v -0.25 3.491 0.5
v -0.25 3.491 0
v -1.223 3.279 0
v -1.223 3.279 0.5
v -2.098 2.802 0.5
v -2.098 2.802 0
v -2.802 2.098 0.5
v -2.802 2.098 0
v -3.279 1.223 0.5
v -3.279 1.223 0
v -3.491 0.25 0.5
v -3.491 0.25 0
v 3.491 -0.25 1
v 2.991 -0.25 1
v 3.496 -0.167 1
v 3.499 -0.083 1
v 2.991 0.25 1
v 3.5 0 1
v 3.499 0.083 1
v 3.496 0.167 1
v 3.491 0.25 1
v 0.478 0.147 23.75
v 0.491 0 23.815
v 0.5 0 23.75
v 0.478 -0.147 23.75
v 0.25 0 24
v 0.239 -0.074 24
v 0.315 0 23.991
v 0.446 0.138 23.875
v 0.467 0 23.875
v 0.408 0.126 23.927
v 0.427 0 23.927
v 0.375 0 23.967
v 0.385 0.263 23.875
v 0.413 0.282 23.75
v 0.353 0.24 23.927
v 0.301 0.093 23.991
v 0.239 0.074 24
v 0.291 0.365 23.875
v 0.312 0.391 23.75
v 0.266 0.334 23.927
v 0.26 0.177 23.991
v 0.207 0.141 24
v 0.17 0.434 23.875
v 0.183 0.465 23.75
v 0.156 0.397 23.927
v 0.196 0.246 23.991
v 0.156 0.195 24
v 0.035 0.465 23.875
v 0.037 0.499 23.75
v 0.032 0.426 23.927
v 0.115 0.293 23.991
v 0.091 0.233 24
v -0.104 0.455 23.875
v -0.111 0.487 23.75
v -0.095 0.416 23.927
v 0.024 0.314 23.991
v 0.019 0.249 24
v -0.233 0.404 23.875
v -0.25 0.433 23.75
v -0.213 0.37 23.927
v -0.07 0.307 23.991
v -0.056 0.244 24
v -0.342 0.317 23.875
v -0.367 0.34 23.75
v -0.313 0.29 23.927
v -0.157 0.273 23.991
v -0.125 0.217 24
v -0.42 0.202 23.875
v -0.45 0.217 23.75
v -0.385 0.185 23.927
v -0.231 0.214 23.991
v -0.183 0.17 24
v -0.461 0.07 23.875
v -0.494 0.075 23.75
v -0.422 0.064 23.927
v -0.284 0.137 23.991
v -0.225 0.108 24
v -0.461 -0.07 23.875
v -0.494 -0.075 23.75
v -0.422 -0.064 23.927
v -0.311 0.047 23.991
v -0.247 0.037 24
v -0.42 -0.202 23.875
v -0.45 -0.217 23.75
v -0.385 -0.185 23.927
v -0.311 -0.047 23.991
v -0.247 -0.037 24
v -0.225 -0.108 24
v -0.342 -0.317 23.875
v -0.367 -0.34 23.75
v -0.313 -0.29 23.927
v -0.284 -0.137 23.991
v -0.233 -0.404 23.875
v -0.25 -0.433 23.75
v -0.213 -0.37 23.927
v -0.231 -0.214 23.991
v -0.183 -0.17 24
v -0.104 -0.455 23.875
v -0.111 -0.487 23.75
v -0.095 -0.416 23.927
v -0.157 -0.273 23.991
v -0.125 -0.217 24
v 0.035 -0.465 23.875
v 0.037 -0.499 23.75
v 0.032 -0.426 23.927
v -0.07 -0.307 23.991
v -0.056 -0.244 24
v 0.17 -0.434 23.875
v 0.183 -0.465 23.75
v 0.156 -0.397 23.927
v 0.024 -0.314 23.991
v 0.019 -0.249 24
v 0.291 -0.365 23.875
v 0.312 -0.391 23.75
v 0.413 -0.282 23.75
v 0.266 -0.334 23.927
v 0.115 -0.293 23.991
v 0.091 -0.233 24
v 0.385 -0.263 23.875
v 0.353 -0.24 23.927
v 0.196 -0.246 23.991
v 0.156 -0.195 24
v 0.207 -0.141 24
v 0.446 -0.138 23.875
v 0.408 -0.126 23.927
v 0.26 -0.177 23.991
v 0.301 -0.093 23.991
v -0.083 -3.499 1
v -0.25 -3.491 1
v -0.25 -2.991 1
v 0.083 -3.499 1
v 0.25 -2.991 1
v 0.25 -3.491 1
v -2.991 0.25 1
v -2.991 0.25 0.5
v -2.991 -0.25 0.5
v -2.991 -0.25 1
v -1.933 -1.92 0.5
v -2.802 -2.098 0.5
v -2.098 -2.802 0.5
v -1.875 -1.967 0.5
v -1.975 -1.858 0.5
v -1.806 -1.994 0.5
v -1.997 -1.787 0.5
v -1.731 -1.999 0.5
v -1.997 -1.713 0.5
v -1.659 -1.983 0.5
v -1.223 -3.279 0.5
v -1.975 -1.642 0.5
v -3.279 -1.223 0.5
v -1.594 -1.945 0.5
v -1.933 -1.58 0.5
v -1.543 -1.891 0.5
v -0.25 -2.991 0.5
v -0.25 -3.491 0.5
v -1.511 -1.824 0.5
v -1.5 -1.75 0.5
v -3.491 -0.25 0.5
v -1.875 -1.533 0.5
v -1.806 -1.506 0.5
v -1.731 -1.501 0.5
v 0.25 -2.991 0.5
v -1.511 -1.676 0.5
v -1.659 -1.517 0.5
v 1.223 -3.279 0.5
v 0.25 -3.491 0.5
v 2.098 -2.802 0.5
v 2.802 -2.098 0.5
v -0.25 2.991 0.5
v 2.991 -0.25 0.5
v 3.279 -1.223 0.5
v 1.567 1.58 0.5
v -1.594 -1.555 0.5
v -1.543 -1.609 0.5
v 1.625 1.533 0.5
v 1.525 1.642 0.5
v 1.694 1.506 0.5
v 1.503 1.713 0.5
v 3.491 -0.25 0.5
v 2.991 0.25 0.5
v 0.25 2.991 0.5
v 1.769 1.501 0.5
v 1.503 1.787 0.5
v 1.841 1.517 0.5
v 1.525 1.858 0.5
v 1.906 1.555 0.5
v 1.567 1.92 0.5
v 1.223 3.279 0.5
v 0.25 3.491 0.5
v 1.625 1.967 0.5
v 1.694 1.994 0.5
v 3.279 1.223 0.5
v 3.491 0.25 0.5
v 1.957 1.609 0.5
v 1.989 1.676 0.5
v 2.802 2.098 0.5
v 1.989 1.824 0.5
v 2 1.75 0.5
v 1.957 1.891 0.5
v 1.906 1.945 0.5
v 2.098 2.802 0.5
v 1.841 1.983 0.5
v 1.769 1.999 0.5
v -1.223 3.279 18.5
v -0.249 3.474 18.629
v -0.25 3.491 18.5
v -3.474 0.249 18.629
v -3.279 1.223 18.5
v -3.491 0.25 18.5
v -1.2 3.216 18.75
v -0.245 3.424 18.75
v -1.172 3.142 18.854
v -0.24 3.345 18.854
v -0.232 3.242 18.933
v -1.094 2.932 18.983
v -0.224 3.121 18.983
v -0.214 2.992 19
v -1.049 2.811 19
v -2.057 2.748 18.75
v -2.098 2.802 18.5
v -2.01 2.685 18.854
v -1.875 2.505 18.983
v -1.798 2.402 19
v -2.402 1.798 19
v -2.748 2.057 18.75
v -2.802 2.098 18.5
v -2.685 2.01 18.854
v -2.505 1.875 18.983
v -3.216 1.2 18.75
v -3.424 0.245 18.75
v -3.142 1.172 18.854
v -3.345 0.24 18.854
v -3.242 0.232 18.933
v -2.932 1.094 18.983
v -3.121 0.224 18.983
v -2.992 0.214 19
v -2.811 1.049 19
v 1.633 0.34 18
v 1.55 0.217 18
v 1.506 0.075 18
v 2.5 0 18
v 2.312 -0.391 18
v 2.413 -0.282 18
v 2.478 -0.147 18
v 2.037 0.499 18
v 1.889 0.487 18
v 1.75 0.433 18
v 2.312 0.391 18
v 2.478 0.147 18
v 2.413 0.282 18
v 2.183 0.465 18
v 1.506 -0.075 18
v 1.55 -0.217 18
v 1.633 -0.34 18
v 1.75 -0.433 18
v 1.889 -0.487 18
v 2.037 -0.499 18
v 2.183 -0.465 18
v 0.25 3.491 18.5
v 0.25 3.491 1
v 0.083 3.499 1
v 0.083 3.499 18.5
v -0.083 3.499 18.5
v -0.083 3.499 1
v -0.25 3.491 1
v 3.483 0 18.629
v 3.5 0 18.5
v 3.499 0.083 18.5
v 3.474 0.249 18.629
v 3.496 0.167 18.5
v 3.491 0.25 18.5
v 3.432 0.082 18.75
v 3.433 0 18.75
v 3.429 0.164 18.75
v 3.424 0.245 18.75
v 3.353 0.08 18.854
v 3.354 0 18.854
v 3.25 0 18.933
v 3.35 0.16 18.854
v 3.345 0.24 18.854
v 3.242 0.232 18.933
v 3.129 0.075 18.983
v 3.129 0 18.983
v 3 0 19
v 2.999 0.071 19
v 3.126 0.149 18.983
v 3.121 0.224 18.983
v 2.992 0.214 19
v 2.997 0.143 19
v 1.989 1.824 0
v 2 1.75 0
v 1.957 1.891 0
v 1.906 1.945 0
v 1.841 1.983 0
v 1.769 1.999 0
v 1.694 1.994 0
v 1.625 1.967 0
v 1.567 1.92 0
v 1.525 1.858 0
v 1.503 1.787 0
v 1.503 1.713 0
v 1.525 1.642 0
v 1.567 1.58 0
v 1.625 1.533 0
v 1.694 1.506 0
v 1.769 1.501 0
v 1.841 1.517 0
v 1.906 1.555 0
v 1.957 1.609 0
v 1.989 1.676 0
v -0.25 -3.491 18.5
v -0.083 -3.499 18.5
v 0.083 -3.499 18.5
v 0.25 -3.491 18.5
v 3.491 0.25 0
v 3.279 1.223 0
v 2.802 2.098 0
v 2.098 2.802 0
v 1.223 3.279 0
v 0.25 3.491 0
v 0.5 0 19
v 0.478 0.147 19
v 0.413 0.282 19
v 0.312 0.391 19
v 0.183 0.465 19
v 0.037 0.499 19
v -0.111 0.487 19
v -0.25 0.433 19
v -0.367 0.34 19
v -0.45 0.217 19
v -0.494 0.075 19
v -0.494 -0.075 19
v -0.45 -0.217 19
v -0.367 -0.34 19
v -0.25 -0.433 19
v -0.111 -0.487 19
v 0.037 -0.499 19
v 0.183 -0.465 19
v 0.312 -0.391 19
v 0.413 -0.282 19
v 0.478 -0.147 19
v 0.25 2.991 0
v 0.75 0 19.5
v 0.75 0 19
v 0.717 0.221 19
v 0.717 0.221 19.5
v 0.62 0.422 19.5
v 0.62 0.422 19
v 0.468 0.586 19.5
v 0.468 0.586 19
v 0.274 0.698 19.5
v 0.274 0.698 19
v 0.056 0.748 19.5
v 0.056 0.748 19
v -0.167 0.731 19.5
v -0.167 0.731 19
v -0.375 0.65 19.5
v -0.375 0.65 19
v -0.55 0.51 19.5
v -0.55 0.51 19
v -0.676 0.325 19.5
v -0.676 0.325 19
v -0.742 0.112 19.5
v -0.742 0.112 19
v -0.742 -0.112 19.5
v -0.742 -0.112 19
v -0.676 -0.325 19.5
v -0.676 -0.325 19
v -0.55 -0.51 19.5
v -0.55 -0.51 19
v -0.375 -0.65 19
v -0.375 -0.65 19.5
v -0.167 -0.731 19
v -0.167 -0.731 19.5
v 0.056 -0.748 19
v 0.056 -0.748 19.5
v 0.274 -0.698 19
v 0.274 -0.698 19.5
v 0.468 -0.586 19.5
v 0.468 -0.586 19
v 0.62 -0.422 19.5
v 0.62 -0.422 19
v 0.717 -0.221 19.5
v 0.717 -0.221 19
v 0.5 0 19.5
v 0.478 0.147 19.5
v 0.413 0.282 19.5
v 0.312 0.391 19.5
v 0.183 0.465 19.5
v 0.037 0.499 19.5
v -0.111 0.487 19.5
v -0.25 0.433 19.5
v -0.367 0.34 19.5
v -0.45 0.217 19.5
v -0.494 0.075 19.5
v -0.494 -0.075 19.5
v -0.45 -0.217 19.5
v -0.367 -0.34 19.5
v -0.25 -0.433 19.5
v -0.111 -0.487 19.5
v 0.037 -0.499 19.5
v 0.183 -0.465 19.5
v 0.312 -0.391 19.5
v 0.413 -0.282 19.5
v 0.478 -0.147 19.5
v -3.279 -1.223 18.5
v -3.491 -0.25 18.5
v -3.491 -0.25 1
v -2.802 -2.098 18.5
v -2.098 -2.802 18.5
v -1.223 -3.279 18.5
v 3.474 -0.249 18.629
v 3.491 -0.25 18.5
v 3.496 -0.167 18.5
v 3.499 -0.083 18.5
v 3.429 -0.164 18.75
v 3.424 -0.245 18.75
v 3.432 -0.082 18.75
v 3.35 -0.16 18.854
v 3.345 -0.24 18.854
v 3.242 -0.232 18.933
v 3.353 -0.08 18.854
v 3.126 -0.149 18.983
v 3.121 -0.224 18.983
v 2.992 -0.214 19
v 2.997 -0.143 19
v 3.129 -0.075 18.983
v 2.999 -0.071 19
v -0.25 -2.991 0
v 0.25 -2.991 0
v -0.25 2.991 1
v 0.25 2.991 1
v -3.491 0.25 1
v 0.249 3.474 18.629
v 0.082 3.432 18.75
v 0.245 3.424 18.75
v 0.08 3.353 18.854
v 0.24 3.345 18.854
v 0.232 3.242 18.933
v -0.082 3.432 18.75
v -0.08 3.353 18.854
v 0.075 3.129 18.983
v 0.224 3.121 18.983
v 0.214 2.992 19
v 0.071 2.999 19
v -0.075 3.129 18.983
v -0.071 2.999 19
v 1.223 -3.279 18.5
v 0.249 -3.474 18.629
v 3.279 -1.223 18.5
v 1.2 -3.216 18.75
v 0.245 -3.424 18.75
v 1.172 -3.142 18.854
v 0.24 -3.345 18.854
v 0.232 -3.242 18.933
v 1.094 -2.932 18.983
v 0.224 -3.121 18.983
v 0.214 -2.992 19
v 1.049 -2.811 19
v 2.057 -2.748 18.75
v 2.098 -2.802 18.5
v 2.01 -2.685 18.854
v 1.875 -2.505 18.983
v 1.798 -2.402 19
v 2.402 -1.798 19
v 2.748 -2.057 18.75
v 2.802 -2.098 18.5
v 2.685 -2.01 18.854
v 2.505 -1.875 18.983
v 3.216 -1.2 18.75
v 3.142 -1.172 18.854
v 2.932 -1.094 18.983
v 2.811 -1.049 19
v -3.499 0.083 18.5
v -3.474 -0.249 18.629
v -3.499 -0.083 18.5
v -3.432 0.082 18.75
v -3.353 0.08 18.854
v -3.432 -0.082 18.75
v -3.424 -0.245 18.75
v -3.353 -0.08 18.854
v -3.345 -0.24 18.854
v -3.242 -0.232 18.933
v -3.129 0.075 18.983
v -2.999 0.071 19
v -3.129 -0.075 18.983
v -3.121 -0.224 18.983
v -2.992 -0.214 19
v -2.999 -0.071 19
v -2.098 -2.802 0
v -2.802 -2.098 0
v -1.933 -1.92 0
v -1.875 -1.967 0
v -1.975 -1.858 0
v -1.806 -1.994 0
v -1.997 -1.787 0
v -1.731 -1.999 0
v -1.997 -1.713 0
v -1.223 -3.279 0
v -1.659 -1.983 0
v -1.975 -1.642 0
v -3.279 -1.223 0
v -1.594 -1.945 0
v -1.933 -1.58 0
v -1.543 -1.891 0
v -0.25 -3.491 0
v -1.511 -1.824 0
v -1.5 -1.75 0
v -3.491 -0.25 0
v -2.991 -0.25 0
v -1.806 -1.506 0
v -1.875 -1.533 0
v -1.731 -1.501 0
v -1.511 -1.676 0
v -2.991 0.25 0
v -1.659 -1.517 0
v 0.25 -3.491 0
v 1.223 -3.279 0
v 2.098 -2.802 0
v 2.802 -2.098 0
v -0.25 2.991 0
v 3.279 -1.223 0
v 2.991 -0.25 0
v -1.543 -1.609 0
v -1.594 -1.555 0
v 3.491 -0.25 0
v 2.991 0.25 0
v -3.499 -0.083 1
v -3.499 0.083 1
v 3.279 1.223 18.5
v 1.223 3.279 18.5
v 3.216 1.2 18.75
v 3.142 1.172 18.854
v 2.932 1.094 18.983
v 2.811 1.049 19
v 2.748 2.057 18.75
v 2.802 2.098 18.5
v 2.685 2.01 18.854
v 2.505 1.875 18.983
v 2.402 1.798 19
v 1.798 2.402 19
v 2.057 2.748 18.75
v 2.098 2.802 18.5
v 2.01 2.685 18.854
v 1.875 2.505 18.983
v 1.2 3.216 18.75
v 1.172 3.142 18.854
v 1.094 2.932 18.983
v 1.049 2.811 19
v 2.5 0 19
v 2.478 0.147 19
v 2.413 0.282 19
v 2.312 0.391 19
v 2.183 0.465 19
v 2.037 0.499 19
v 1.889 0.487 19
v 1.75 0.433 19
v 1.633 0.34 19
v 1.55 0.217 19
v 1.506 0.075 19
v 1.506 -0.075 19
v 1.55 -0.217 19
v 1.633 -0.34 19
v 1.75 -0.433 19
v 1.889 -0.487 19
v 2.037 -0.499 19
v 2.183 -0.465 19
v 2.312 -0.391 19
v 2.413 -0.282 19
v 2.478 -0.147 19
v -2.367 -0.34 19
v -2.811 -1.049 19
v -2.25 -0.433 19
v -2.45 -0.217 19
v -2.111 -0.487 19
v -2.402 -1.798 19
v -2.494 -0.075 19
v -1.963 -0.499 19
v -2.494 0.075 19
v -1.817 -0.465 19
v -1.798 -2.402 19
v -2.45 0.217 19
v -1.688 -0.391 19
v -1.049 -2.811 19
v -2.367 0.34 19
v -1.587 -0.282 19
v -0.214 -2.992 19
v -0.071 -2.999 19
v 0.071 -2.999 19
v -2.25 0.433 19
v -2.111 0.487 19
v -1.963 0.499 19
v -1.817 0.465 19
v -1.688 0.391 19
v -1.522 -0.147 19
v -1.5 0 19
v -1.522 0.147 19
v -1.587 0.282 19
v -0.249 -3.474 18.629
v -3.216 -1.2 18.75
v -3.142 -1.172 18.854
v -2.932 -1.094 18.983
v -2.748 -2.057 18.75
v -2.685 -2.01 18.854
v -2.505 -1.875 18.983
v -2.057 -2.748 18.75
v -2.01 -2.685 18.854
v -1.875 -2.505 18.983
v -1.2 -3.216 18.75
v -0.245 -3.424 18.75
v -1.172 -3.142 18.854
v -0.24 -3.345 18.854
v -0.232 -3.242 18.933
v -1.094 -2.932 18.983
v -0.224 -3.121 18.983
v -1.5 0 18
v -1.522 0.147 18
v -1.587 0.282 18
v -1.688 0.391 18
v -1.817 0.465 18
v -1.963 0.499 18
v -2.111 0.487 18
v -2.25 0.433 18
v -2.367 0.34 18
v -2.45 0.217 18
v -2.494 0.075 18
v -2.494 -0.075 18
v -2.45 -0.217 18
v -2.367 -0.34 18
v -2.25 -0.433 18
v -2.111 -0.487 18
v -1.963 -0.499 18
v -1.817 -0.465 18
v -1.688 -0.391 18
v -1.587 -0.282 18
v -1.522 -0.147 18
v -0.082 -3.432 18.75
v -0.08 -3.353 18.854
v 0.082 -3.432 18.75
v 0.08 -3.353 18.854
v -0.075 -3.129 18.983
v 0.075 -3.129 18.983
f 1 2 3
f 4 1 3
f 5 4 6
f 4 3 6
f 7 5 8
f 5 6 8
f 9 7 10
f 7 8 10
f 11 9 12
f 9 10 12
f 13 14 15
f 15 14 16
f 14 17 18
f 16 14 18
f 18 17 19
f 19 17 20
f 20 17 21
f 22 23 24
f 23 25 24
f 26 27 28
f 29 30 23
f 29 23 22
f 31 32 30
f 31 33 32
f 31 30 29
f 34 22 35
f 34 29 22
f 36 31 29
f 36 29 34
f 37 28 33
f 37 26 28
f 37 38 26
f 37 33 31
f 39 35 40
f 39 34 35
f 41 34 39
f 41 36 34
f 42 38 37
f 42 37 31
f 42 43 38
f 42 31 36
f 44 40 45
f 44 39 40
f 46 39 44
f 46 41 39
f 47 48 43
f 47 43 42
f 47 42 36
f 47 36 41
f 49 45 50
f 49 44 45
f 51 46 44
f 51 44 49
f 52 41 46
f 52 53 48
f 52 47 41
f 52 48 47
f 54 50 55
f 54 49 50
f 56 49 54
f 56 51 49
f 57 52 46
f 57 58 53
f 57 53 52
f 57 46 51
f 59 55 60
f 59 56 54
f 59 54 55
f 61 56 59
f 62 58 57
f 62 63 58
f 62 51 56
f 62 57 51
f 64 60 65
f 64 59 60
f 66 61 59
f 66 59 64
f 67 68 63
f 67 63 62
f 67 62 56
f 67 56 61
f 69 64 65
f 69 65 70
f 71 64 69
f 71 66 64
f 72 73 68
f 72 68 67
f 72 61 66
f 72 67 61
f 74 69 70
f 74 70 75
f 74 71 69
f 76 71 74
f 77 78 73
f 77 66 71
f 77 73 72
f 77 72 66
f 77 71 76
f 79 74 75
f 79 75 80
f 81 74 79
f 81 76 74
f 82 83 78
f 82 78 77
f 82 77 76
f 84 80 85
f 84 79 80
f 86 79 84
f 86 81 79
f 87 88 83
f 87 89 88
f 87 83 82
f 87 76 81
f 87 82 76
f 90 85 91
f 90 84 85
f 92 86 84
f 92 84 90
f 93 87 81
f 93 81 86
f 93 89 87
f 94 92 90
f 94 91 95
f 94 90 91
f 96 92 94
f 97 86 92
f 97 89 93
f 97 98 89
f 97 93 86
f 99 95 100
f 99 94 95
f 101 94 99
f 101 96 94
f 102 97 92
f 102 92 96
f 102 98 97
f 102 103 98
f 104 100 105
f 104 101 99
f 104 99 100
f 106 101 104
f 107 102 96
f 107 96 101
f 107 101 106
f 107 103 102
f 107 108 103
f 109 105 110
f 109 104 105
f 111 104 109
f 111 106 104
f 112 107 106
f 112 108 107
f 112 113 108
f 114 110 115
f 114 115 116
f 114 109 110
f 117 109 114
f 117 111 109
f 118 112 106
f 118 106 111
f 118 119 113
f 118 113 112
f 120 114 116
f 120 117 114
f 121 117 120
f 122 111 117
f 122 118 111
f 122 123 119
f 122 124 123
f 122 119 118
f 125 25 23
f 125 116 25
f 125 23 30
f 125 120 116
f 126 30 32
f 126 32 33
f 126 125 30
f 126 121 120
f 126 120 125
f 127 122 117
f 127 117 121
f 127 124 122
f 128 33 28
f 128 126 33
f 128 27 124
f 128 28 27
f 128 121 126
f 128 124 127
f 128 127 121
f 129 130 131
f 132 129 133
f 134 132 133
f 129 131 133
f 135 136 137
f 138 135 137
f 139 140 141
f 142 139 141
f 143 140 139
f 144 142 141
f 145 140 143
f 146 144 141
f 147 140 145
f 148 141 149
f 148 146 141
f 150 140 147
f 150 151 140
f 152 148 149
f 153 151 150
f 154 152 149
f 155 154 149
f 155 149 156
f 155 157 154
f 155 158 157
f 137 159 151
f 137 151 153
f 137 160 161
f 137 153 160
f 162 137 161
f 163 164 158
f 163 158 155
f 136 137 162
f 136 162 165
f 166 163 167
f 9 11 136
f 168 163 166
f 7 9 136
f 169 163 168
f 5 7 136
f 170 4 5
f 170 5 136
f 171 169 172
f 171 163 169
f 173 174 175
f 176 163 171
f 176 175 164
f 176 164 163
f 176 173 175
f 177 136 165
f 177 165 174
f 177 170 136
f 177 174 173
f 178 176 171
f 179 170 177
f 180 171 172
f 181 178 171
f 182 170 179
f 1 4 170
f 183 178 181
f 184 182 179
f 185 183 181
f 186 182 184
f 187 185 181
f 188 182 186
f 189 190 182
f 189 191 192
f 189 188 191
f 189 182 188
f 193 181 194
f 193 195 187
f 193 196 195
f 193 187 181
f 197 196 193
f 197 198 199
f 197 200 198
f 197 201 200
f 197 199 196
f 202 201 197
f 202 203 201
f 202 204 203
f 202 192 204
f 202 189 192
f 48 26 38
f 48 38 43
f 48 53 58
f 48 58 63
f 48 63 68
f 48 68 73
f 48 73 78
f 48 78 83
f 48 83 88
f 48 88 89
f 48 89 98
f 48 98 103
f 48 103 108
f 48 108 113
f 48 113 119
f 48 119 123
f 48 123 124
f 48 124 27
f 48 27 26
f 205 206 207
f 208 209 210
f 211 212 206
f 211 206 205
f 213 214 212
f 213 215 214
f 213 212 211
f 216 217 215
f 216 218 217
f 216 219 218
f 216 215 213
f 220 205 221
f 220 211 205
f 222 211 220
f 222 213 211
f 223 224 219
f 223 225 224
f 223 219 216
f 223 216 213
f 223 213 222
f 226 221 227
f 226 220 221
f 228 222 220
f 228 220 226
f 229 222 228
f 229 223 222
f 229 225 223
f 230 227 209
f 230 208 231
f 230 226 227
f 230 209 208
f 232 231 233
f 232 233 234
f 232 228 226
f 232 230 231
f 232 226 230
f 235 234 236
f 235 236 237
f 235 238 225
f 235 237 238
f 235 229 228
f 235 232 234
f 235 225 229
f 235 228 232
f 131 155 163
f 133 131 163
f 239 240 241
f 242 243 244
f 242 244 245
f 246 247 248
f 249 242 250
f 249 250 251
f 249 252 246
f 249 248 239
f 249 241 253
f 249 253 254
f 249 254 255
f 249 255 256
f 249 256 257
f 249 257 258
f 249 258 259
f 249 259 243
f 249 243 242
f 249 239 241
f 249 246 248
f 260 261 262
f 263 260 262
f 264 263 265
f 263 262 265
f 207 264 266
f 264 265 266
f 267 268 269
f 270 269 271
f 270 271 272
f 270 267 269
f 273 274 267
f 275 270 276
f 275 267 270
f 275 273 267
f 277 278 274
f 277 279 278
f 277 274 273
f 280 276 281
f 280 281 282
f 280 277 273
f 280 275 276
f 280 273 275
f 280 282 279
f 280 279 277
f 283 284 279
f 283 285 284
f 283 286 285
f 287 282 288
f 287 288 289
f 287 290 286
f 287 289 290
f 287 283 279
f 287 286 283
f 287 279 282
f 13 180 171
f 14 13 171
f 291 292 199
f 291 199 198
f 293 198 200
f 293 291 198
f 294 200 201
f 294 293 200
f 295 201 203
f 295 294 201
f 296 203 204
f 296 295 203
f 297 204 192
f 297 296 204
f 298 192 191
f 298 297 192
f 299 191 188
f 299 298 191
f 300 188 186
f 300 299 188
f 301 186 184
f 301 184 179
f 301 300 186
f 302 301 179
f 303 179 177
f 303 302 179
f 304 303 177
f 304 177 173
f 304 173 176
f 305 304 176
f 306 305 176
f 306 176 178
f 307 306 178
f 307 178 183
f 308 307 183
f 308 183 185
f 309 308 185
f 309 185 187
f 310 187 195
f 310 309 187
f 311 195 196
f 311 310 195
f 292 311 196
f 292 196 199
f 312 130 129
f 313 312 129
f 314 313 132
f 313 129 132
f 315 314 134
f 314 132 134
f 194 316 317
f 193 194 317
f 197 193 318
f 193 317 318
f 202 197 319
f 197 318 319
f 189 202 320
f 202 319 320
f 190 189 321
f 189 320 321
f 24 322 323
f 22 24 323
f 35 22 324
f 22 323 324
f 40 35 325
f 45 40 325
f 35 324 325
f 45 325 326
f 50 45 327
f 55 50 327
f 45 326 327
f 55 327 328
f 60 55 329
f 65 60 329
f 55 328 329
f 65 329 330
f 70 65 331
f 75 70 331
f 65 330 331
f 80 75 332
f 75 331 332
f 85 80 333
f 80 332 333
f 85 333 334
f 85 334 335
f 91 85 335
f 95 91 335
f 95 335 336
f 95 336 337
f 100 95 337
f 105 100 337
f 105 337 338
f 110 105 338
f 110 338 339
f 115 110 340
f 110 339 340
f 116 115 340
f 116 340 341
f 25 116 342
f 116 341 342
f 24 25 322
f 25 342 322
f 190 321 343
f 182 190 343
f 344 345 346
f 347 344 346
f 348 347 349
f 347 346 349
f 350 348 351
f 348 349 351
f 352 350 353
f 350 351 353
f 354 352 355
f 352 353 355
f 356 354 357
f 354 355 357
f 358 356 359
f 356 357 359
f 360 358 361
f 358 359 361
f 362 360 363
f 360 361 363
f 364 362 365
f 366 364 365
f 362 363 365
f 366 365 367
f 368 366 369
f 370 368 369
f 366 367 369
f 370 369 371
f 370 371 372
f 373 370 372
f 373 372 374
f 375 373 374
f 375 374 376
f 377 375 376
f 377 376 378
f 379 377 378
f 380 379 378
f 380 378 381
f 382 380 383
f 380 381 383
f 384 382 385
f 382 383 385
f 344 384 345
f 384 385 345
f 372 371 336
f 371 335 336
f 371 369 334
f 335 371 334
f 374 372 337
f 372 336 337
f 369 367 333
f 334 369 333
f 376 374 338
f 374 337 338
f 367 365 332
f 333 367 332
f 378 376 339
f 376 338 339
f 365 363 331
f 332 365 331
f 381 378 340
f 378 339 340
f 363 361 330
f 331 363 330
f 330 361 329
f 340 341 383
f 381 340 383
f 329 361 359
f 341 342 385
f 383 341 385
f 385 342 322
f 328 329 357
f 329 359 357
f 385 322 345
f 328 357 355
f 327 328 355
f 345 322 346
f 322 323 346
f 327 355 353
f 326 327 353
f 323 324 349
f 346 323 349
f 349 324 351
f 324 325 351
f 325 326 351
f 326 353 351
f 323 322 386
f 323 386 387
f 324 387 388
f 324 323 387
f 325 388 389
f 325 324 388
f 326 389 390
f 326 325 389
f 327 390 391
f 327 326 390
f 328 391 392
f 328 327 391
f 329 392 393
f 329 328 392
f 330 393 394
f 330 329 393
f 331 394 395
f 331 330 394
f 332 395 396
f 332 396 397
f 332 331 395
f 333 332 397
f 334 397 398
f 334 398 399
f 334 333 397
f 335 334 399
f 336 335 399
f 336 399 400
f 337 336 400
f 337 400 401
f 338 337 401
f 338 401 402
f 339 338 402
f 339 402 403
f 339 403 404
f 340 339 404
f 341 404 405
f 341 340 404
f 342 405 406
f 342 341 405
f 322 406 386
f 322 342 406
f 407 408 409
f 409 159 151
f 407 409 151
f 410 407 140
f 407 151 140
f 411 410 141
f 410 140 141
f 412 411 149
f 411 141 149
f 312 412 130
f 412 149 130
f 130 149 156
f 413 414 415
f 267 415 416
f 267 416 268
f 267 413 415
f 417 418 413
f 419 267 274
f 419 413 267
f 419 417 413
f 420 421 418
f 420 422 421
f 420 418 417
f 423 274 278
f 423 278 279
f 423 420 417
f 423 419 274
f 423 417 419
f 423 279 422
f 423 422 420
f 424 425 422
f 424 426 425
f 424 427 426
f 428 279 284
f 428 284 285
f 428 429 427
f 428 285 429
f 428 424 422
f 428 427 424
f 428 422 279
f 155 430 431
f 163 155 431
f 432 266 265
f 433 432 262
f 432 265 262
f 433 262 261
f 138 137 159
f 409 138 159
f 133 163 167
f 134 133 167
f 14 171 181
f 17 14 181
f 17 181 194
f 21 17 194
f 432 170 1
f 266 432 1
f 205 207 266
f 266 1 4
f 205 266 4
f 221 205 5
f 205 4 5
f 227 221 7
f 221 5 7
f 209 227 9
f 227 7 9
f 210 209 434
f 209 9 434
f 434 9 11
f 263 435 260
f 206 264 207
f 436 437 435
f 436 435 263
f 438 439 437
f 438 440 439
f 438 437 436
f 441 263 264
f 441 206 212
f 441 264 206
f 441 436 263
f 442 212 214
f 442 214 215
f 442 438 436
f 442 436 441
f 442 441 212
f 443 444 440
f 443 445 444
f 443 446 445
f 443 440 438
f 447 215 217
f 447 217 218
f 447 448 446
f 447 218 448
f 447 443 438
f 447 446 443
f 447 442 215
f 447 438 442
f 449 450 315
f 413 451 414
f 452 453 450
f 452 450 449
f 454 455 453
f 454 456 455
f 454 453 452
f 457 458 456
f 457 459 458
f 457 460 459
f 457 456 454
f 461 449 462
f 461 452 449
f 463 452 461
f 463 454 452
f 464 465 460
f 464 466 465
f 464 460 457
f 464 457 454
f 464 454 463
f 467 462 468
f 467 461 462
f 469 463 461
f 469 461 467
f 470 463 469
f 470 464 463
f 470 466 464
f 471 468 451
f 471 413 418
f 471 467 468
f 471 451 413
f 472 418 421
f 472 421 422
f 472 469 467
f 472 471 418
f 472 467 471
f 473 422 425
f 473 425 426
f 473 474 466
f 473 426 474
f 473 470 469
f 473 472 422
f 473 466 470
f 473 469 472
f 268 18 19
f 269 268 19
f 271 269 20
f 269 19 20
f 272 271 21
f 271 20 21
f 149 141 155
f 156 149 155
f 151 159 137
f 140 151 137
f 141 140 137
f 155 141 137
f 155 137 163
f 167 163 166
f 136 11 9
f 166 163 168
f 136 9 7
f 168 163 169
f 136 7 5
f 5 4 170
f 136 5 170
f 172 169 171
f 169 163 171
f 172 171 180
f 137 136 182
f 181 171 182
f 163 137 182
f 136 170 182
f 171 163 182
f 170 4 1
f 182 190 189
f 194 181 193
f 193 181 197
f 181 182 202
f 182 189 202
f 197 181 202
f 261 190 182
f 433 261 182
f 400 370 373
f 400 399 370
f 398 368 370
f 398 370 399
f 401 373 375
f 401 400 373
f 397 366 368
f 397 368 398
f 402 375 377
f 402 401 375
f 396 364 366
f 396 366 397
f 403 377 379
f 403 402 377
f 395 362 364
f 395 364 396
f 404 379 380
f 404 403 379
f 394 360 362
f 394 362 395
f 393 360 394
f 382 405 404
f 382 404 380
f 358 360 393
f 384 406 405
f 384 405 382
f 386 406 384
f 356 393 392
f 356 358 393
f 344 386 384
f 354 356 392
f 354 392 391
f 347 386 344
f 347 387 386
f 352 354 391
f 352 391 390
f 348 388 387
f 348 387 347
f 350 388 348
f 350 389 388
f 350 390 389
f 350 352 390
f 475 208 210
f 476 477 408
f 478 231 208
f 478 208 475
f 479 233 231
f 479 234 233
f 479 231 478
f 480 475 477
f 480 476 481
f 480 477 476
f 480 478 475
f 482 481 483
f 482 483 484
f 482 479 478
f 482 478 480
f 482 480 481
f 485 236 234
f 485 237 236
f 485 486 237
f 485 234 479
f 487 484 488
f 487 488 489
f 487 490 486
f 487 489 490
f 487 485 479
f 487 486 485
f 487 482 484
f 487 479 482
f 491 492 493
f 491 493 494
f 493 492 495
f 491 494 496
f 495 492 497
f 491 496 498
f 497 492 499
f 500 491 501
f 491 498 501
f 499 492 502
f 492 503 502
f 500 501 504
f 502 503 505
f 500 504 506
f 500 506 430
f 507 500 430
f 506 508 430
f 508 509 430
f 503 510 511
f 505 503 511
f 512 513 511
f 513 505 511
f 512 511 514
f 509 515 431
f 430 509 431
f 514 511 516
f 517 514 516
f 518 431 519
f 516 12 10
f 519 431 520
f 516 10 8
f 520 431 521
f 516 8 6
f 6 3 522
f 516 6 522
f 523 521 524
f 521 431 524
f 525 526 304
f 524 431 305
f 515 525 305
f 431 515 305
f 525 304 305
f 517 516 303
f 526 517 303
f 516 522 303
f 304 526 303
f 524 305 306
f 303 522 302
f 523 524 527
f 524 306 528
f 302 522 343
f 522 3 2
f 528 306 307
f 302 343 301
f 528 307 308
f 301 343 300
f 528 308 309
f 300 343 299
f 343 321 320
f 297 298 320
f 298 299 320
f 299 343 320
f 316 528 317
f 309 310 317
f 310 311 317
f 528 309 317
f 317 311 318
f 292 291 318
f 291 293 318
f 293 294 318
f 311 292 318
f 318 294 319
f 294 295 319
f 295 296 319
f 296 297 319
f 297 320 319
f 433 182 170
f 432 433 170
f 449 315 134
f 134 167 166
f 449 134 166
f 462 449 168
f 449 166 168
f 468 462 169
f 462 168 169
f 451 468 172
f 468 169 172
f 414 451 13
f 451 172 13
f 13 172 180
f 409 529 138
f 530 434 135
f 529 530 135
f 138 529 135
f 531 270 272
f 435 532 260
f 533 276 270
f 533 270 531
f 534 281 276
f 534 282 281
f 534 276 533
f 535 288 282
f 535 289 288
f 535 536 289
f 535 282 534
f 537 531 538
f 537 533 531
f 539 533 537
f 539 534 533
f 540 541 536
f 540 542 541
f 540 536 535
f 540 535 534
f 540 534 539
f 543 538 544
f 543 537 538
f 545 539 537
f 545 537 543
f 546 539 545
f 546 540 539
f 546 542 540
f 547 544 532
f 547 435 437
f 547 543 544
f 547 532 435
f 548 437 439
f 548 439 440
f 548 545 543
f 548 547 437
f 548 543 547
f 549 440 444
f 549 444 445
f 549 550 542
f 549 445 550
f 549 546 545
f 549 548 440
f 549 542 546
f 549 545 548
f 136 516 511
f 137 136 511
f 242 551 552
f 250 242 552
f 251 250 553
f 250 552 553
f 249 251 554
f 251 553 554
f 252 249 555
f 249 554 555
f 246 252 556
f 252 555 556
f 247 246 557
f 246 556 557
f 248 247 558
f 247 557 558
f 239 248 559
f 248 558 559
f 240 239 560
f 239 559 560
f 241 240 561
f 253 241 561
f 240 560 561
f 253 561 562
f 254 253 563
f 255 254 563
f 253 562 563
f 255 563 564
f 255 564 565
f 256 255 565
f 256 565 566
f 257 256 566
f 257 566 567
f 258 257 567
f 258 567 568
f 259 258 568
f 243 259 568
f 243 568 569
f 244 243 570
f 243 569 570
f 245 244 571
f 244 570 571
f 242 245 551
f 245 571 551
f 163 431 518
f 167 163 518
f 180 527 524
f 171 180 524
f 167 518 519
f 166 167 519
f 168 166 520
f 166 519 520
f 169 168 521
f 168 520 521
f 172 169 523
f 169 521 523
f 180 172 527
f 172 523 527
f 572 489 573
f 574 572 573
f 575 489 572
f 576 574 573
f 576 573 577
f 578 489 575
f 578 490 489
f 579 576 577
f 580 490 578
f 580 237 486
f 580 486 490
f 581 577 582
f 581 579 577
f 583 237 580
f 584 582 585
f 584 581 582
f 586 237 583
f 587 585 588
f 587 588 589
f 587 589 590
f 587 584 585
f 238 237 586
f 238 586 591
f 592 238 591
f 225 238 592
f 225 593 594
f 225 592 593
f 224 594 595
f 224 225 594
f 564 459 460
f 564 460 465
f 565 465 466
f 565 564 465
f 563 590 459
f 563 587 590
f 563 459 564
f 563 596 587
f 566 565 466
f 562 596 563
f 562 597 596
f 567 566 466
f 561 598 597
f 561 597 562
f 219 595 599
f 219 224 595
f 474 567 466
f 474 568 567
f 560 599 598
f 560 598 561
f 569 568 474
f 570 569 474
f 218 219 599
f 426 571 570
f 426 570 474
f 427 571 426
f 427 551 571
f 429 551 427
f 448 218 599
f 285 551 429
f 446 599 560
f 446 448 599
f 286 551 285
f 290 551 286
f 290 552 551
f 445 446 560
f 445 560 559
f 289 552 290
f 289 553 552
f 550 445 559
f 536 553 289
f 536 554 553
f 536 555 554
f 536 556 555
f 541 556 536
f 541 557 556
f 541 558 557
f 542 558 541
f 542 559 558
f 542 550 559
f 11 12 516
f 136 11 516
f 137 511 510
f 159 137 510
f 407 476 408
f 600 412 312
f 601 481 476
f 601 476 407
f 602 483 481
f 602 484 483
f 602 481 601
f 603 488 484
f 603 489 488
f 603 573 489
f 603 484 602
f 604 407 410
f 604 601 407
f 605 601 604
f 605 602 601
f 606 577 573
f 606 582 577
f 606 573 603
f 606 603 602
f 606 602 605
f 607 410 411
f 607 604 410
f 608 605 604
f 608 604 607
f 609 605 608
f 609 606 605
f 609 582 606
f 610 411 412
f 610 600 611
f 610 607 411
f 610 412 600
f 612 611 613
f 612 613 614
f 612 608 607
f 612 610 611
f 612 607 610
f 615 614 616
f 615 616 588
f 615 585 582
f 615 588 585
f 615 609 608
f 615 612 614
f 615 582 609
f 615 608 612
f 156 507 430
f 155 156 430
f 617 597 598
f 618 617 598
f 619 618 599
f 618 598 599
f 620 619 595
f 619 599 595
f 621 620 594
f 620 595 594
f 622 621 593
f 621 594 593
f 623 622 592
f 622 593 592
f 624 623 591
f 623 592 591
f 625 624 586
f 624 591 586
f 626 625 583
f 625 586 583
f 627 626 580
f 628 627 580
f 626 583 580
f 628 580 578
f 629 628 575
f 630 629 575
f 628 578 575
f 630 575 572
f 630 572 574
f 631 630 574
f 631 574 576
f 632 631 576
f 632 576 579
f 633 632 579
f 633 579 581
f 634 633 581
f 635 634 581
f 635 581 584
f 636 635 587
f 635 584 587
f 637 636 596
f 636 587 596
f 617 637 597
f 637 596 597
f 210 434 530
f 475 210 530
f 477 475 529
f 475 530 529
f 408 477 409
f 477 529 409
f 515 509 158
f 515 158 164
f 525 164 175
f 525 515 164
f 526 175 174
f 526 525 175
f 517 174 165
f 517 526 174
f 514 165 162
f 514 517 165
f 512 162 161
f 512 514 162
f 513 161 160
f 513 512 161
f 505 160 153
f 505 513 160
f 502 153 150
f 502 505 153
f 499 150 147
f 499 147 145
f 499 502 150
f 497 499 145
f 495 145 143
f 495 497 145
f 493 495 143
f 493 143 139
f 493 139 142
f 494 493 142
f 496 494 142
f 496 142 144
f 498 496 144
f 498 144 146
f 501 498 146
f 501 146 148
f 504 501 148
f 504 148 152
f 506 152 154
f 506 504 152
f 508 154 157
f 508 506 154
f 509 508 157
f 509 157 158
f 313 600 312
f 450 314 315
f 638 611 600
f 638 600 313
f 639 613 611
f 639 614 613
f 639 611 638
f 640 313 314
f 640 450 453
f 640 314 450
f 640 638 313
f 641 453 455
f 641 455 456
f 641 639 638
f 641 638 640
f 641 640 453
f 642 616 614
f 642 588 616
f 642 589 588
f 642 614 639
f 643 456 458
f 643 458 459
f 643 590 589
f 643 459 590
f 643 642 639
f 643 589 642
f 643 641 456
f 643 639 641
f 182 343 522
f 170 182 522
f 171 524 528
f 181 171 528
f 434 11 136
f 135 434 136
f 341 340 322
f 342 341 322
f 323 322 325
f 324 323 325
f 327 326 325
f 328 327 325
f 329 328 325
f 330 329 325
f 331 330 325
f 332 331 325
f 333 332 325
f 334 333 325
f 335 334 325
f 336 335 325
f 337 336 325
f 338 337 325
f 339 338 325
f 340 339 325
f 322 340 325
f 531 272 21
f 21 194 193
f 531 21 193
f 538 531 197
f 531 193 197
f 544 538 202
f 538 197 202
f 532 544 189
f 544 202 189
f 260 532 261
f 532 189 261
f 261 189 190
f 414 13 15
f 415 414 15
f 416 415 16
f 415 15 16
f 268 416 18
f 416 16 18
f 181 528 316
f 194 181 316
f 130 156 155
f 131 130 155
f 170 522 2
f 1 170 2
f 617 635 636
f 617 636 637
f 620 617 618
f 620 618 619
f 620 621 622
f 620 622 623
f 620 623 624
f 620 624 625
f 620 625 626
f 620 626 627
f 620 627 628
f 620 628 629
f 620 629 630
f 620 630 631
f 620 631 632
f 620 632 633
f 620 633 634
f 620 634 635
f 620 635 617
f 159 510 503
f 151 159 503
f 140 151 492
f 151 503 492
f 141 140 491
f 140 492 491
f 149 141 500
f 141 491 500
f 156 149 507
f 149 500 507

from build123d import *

# Parameters (mm, degrees)
F0_R     = 0.25
F1_DEPTH = 0.5
F2_START = 0.5
F2_DEPTH = 0.5
F3_START = 1
F3_DEPTH = 18
F4_R     = 0.5
F5_R     = 0.5
F6_DEPTH = 1
F5_R_2   = 0.75
F7_DEPTH = 0.5
F8_DEPTH = 5
F9_R     = 0.25


with BuildPart() as f1:
    # F0 (on Top) → F1 (new body)
    with BuildSketch(Plane.XY):
        with BuildLine():
            Line((0.25, 2.9910600109), (-0.25, 2.9910600109))
            Line((-0.25, 2.9910600109), (-0.25, 3.4910600109))
            ThreePointArc((-0.25, 3.4910600109), (-2.4748737342, 2.4748737342), (-3.4910600109, 0.25))
            Line((-3.4910600109, 0.25), (-2.9910600109, 0.25))
            Line((-2.9910600109, 0.25), (-2.9910600109, -0.25))
            Line((-2.9910600109, -0.25), (-3.4910600109, -0.25))
            ThreePointArc((-3.4910600109, -0.25), (-2.4748737342, -2.4748737342), (-0.25, -3.4910600109))
            Line((-0.25, -3.4910600109), (-0.25, -2.9910600109))
            Line((-0.25, -2.9910600109), (0.25, -2.9910600109))
            Line((0.25, -2.9910600109), (0.25, -3.4910600109))
            ThreePointArc((0.25, -3.4910600109), (2.4748737342, -2.4748737342), (3.4910600109, -0.25))
            Line((3.4910600109, -0.25), (2.9910600109, -0.25))
            Line((2.9910600109, -0.25), (2.9910600109, 0.25))
            Line((2.9910600109, 0.25), (3.4910600109, 0.25))
            ThreePointArc((3.4910600109, 0.25), (2.4748737342, 2.4748737342), (0.25, 3.4910600109))
            Line((0.25, 3.4910600109), (0.25, 2.9910600109))
        make_face()
        with Locations((-1.75, -1.75)):
            Circle(F0_R, mode=Mode.SUBTRACT)
        with Locations((1.75, 1.75)):
            Circle(F0_R, mode=Mode.SUBTRACT)
    extrude(amount=F1_DEPTH)


with BuildPart() as f2:
    # F0 (on Top) → F2 (new body)
    with BuildSketch(Plane.XY.offset(F2_START)):
        with BuildLine():
            Line((0.25, 2.9910600109), (-0.25, 2.9910600109))
            Line((-0.25, 2.9910600109), (-0.25, 3.4910600109))
            ThreePointArc((-0.25, 3.4910600109), (-2.4748737342, 2.4748737342), (-3.4910600109, 0.25))
            Line((-3.4910600109, 0.25), (-2.9910600109, 0.25))
            Line((-2.9910600109, 0.25), (-2.9910600109, -0.25))
            Line((-2.9910600109, -0.25), (-3.4910600109, -0.25))
            ThreePointArc((-3.4910600109, -0.25), (-2.4748737342, -2.4748737342), (-0.25, -3.4910600109))
            Line((-0.25, -3.4910600109), (-0.25, -2.9910600109))
            Line((-0.25, -2.9910600109), (0.25, -2.9910600109))
            Line((0.25, -2.9910600109), (0.25, -3.4910600109))
            ThreePointArc((0.25, -3.4910600109), (2.4748737342, -2.4748737342), (3.4910600109, -0.25))
            Line((3.4910600109, -0.25), (2.9910600109, -0.25))
            Line((2.9910600109, -0.25), (2.9910600109, 0.25))
            Line((2.9910600109, 0.25), (3.4910600109, 0.25))
            ThreePointArc((3.4910600109, 0.25), (2.4748737342, 2.4748737342), (0.25, 3.4910600109))
            Line((0.25, 3.4910600109), (0.25, 2.9910600109))
        make_face()
        with Locations((-1.75, -1.75)):
            Circle(F0_R, mode=Mode.SUBTRACT)
        with Locations((1.75, 1.75)):
            Circle(F0_R, mode=Mode.SUBTRACT)
        with Locations((-1.75, -1.75)):
            Circle(F0_R)
        with Locations((1.75, 1.75)):
            Circle(F0_R)
    extrude(amount=F2_DEPTH)

    # F0 (on Top) → F3 (join)
    with BuildSketch(Plane.XY.offset(F3_START)):
        with BuildLine():
            Line((0.25, 2.9910600109), (-0.25, 2.9910600109))
            Line((-0.25, 2.9910600109), (-0.25, 3.4910600109))
            ThreePointArc((-0.25, 3.4910600109), (-2.4748737342, 2.4748737342), (-3.4910600109, 0.25))
            Line((-3.4910600109, 0.25), (-2.9910600109, 0.25))
            Line((-2.9910600109, 0.25), (-2.9910600109, -0.25))
            Line((-2.9910600109, -0.25), (-3.4910600109, -0.25))
            ThreePointArc((-3.4910600109, -0.25), (-2.4748737342, -2.4748737342), (-0.25, -3.4910600109))
            Line((-0.25, -3.4910600109), (-0.25, -2.9910600109))
            Line((-0.25, -2.9910600109), (0.25, -2.9910600109))
            Line((0.25, -2.9910600109), (0.25, -3.4910600109))
            ThreePointArc((0.25, -3.4910600109), (2.4748737342, -2.4748737342), (3.4910600109, -0.25))
            Line((3.4910600109, -0.25), (2.9910600109, -0.25))
            Line((2.9910600109, -0.25), (2.9910600109, 0.25))
            Line((2.9910600109, 0.25), (3.4910600109, 0.25))
            ThreePointArc((3.4910600109, 0.25), (2.4748737342, 2.4748737342), (0.25, 3.4910600109))
            Line((0.25, 3.4910600109), (0.25, 2.9910600109))
        make_face()
        with Locations((-1.75, -1.75)):
            Circle(F0_R, mode=Mode.SUBTRACT)
        with Locations((1.75, 1.75)):
            Circle(F0_R, mode=Mode.SUBTRACT)
        with BuildLine():
            Line((-0.25, -2.9910600109), (-0.25, -3.4910600109))
            ThreePointArc((-0.25, -3.4910600109), (0, -3.5), (0.25, -3.4910600109))
            Line((0.25, -3.4910600109), (0.25, -2.9910600109))
            Line((0.25, -2.9910600109), (-0.25, -2.9910600109))
        make_face()
        with BuildLine():
            Line((-2.9910600109, 0.25), (-3.4910600109, 0.25))
            ThreePointArc((-3.4910600109, 0.25), (-3.5, 0), (-3.4910600109, -0.25))
            Line((-3.4910600109, -0.25), (-2.9910600109, -0.25))
            Line((-2.9910600109, -0.25), (-2.9910600109, 0.25))
        make_face()
        with BuildLine():
            Line((-0.25, 3.4910600109), (-0.25, 2.9910600109))
            Line((-0.25, 2.9910600109), (0.25, 2.9910600109))
            Line((0.25, 2.9910600109), (0.25, 3.4910600109))
            ThreePointArc((0.25, 3.4910600109), (0, 3.5), (-0.25, 3.4910600109))
        make_face()
        with Locations((-1.75, -1.75)):
            Circle(F0_R)
        with Locations((1.75, 1.75)):
            Circle(F0_R)
        with BuildLine():
            ThreePointArc((3.5, 0), (3.4977642887, 0.1250798979), (3.4910600109, 0.25))
            Line((3.4910600109, 0.25), (2.9910600109, 0.25))
            Line((2.9910600109, 0.25), (2.9910600109, -0.25))
            Line((2.9910600109, -0.25), (3.4910600109, -0.25))
            ThreePointArc((3.4910600109, -0.25), (3.4977642887, -0.1250798979), (3.5, 0))
        make_face()
    extrude(amount=F3_DEPTH)

    # F4
    f4_edges = [f2.edges().sort_by_distance(p)[0] for p in [
        (-3.49106, 0.25, 19),
    ]]
    fillet(f4_edges, radius=F4_R)

    # F5 (on face) → F6 (cut)
    with BuildSketch(Plane.XY.offset(19)):
        with Locations((-2, 0)):
            Circle(F5_R)
        with Locations((2, 0)):
            Circle(F5_R)
    extrude(amount=-F6_DEPTH, mode=Mode.SUBTRACT)


with BuildPart() as f7:
    # F5 (on face) → F7 (new body)
    with BuildSketch(Plane.XY.offset(19)):
        Circle(F5_R_2)
        Circle(F5_R, mode=Mode.SUBTRACT)
    extrude(amount=F7_DEPTH)


with BuildPart() as f8:
    # F5 (on face) → F8 (new body)
    with BuildSketch(Plane.XY.offset(19)):
        Circle(F5_R)
    extrude(amount=F8_DEPTH)

    # F9
    f9_edges = [f8.edges().sort_by_distance(p)[0] for p in [
        (-0.5, 0, 24),
    ]]
    fillet(f9_edges, radius=F9_R)


solid = Compound([f1.part, f2.part, f7.part, f8.part])
